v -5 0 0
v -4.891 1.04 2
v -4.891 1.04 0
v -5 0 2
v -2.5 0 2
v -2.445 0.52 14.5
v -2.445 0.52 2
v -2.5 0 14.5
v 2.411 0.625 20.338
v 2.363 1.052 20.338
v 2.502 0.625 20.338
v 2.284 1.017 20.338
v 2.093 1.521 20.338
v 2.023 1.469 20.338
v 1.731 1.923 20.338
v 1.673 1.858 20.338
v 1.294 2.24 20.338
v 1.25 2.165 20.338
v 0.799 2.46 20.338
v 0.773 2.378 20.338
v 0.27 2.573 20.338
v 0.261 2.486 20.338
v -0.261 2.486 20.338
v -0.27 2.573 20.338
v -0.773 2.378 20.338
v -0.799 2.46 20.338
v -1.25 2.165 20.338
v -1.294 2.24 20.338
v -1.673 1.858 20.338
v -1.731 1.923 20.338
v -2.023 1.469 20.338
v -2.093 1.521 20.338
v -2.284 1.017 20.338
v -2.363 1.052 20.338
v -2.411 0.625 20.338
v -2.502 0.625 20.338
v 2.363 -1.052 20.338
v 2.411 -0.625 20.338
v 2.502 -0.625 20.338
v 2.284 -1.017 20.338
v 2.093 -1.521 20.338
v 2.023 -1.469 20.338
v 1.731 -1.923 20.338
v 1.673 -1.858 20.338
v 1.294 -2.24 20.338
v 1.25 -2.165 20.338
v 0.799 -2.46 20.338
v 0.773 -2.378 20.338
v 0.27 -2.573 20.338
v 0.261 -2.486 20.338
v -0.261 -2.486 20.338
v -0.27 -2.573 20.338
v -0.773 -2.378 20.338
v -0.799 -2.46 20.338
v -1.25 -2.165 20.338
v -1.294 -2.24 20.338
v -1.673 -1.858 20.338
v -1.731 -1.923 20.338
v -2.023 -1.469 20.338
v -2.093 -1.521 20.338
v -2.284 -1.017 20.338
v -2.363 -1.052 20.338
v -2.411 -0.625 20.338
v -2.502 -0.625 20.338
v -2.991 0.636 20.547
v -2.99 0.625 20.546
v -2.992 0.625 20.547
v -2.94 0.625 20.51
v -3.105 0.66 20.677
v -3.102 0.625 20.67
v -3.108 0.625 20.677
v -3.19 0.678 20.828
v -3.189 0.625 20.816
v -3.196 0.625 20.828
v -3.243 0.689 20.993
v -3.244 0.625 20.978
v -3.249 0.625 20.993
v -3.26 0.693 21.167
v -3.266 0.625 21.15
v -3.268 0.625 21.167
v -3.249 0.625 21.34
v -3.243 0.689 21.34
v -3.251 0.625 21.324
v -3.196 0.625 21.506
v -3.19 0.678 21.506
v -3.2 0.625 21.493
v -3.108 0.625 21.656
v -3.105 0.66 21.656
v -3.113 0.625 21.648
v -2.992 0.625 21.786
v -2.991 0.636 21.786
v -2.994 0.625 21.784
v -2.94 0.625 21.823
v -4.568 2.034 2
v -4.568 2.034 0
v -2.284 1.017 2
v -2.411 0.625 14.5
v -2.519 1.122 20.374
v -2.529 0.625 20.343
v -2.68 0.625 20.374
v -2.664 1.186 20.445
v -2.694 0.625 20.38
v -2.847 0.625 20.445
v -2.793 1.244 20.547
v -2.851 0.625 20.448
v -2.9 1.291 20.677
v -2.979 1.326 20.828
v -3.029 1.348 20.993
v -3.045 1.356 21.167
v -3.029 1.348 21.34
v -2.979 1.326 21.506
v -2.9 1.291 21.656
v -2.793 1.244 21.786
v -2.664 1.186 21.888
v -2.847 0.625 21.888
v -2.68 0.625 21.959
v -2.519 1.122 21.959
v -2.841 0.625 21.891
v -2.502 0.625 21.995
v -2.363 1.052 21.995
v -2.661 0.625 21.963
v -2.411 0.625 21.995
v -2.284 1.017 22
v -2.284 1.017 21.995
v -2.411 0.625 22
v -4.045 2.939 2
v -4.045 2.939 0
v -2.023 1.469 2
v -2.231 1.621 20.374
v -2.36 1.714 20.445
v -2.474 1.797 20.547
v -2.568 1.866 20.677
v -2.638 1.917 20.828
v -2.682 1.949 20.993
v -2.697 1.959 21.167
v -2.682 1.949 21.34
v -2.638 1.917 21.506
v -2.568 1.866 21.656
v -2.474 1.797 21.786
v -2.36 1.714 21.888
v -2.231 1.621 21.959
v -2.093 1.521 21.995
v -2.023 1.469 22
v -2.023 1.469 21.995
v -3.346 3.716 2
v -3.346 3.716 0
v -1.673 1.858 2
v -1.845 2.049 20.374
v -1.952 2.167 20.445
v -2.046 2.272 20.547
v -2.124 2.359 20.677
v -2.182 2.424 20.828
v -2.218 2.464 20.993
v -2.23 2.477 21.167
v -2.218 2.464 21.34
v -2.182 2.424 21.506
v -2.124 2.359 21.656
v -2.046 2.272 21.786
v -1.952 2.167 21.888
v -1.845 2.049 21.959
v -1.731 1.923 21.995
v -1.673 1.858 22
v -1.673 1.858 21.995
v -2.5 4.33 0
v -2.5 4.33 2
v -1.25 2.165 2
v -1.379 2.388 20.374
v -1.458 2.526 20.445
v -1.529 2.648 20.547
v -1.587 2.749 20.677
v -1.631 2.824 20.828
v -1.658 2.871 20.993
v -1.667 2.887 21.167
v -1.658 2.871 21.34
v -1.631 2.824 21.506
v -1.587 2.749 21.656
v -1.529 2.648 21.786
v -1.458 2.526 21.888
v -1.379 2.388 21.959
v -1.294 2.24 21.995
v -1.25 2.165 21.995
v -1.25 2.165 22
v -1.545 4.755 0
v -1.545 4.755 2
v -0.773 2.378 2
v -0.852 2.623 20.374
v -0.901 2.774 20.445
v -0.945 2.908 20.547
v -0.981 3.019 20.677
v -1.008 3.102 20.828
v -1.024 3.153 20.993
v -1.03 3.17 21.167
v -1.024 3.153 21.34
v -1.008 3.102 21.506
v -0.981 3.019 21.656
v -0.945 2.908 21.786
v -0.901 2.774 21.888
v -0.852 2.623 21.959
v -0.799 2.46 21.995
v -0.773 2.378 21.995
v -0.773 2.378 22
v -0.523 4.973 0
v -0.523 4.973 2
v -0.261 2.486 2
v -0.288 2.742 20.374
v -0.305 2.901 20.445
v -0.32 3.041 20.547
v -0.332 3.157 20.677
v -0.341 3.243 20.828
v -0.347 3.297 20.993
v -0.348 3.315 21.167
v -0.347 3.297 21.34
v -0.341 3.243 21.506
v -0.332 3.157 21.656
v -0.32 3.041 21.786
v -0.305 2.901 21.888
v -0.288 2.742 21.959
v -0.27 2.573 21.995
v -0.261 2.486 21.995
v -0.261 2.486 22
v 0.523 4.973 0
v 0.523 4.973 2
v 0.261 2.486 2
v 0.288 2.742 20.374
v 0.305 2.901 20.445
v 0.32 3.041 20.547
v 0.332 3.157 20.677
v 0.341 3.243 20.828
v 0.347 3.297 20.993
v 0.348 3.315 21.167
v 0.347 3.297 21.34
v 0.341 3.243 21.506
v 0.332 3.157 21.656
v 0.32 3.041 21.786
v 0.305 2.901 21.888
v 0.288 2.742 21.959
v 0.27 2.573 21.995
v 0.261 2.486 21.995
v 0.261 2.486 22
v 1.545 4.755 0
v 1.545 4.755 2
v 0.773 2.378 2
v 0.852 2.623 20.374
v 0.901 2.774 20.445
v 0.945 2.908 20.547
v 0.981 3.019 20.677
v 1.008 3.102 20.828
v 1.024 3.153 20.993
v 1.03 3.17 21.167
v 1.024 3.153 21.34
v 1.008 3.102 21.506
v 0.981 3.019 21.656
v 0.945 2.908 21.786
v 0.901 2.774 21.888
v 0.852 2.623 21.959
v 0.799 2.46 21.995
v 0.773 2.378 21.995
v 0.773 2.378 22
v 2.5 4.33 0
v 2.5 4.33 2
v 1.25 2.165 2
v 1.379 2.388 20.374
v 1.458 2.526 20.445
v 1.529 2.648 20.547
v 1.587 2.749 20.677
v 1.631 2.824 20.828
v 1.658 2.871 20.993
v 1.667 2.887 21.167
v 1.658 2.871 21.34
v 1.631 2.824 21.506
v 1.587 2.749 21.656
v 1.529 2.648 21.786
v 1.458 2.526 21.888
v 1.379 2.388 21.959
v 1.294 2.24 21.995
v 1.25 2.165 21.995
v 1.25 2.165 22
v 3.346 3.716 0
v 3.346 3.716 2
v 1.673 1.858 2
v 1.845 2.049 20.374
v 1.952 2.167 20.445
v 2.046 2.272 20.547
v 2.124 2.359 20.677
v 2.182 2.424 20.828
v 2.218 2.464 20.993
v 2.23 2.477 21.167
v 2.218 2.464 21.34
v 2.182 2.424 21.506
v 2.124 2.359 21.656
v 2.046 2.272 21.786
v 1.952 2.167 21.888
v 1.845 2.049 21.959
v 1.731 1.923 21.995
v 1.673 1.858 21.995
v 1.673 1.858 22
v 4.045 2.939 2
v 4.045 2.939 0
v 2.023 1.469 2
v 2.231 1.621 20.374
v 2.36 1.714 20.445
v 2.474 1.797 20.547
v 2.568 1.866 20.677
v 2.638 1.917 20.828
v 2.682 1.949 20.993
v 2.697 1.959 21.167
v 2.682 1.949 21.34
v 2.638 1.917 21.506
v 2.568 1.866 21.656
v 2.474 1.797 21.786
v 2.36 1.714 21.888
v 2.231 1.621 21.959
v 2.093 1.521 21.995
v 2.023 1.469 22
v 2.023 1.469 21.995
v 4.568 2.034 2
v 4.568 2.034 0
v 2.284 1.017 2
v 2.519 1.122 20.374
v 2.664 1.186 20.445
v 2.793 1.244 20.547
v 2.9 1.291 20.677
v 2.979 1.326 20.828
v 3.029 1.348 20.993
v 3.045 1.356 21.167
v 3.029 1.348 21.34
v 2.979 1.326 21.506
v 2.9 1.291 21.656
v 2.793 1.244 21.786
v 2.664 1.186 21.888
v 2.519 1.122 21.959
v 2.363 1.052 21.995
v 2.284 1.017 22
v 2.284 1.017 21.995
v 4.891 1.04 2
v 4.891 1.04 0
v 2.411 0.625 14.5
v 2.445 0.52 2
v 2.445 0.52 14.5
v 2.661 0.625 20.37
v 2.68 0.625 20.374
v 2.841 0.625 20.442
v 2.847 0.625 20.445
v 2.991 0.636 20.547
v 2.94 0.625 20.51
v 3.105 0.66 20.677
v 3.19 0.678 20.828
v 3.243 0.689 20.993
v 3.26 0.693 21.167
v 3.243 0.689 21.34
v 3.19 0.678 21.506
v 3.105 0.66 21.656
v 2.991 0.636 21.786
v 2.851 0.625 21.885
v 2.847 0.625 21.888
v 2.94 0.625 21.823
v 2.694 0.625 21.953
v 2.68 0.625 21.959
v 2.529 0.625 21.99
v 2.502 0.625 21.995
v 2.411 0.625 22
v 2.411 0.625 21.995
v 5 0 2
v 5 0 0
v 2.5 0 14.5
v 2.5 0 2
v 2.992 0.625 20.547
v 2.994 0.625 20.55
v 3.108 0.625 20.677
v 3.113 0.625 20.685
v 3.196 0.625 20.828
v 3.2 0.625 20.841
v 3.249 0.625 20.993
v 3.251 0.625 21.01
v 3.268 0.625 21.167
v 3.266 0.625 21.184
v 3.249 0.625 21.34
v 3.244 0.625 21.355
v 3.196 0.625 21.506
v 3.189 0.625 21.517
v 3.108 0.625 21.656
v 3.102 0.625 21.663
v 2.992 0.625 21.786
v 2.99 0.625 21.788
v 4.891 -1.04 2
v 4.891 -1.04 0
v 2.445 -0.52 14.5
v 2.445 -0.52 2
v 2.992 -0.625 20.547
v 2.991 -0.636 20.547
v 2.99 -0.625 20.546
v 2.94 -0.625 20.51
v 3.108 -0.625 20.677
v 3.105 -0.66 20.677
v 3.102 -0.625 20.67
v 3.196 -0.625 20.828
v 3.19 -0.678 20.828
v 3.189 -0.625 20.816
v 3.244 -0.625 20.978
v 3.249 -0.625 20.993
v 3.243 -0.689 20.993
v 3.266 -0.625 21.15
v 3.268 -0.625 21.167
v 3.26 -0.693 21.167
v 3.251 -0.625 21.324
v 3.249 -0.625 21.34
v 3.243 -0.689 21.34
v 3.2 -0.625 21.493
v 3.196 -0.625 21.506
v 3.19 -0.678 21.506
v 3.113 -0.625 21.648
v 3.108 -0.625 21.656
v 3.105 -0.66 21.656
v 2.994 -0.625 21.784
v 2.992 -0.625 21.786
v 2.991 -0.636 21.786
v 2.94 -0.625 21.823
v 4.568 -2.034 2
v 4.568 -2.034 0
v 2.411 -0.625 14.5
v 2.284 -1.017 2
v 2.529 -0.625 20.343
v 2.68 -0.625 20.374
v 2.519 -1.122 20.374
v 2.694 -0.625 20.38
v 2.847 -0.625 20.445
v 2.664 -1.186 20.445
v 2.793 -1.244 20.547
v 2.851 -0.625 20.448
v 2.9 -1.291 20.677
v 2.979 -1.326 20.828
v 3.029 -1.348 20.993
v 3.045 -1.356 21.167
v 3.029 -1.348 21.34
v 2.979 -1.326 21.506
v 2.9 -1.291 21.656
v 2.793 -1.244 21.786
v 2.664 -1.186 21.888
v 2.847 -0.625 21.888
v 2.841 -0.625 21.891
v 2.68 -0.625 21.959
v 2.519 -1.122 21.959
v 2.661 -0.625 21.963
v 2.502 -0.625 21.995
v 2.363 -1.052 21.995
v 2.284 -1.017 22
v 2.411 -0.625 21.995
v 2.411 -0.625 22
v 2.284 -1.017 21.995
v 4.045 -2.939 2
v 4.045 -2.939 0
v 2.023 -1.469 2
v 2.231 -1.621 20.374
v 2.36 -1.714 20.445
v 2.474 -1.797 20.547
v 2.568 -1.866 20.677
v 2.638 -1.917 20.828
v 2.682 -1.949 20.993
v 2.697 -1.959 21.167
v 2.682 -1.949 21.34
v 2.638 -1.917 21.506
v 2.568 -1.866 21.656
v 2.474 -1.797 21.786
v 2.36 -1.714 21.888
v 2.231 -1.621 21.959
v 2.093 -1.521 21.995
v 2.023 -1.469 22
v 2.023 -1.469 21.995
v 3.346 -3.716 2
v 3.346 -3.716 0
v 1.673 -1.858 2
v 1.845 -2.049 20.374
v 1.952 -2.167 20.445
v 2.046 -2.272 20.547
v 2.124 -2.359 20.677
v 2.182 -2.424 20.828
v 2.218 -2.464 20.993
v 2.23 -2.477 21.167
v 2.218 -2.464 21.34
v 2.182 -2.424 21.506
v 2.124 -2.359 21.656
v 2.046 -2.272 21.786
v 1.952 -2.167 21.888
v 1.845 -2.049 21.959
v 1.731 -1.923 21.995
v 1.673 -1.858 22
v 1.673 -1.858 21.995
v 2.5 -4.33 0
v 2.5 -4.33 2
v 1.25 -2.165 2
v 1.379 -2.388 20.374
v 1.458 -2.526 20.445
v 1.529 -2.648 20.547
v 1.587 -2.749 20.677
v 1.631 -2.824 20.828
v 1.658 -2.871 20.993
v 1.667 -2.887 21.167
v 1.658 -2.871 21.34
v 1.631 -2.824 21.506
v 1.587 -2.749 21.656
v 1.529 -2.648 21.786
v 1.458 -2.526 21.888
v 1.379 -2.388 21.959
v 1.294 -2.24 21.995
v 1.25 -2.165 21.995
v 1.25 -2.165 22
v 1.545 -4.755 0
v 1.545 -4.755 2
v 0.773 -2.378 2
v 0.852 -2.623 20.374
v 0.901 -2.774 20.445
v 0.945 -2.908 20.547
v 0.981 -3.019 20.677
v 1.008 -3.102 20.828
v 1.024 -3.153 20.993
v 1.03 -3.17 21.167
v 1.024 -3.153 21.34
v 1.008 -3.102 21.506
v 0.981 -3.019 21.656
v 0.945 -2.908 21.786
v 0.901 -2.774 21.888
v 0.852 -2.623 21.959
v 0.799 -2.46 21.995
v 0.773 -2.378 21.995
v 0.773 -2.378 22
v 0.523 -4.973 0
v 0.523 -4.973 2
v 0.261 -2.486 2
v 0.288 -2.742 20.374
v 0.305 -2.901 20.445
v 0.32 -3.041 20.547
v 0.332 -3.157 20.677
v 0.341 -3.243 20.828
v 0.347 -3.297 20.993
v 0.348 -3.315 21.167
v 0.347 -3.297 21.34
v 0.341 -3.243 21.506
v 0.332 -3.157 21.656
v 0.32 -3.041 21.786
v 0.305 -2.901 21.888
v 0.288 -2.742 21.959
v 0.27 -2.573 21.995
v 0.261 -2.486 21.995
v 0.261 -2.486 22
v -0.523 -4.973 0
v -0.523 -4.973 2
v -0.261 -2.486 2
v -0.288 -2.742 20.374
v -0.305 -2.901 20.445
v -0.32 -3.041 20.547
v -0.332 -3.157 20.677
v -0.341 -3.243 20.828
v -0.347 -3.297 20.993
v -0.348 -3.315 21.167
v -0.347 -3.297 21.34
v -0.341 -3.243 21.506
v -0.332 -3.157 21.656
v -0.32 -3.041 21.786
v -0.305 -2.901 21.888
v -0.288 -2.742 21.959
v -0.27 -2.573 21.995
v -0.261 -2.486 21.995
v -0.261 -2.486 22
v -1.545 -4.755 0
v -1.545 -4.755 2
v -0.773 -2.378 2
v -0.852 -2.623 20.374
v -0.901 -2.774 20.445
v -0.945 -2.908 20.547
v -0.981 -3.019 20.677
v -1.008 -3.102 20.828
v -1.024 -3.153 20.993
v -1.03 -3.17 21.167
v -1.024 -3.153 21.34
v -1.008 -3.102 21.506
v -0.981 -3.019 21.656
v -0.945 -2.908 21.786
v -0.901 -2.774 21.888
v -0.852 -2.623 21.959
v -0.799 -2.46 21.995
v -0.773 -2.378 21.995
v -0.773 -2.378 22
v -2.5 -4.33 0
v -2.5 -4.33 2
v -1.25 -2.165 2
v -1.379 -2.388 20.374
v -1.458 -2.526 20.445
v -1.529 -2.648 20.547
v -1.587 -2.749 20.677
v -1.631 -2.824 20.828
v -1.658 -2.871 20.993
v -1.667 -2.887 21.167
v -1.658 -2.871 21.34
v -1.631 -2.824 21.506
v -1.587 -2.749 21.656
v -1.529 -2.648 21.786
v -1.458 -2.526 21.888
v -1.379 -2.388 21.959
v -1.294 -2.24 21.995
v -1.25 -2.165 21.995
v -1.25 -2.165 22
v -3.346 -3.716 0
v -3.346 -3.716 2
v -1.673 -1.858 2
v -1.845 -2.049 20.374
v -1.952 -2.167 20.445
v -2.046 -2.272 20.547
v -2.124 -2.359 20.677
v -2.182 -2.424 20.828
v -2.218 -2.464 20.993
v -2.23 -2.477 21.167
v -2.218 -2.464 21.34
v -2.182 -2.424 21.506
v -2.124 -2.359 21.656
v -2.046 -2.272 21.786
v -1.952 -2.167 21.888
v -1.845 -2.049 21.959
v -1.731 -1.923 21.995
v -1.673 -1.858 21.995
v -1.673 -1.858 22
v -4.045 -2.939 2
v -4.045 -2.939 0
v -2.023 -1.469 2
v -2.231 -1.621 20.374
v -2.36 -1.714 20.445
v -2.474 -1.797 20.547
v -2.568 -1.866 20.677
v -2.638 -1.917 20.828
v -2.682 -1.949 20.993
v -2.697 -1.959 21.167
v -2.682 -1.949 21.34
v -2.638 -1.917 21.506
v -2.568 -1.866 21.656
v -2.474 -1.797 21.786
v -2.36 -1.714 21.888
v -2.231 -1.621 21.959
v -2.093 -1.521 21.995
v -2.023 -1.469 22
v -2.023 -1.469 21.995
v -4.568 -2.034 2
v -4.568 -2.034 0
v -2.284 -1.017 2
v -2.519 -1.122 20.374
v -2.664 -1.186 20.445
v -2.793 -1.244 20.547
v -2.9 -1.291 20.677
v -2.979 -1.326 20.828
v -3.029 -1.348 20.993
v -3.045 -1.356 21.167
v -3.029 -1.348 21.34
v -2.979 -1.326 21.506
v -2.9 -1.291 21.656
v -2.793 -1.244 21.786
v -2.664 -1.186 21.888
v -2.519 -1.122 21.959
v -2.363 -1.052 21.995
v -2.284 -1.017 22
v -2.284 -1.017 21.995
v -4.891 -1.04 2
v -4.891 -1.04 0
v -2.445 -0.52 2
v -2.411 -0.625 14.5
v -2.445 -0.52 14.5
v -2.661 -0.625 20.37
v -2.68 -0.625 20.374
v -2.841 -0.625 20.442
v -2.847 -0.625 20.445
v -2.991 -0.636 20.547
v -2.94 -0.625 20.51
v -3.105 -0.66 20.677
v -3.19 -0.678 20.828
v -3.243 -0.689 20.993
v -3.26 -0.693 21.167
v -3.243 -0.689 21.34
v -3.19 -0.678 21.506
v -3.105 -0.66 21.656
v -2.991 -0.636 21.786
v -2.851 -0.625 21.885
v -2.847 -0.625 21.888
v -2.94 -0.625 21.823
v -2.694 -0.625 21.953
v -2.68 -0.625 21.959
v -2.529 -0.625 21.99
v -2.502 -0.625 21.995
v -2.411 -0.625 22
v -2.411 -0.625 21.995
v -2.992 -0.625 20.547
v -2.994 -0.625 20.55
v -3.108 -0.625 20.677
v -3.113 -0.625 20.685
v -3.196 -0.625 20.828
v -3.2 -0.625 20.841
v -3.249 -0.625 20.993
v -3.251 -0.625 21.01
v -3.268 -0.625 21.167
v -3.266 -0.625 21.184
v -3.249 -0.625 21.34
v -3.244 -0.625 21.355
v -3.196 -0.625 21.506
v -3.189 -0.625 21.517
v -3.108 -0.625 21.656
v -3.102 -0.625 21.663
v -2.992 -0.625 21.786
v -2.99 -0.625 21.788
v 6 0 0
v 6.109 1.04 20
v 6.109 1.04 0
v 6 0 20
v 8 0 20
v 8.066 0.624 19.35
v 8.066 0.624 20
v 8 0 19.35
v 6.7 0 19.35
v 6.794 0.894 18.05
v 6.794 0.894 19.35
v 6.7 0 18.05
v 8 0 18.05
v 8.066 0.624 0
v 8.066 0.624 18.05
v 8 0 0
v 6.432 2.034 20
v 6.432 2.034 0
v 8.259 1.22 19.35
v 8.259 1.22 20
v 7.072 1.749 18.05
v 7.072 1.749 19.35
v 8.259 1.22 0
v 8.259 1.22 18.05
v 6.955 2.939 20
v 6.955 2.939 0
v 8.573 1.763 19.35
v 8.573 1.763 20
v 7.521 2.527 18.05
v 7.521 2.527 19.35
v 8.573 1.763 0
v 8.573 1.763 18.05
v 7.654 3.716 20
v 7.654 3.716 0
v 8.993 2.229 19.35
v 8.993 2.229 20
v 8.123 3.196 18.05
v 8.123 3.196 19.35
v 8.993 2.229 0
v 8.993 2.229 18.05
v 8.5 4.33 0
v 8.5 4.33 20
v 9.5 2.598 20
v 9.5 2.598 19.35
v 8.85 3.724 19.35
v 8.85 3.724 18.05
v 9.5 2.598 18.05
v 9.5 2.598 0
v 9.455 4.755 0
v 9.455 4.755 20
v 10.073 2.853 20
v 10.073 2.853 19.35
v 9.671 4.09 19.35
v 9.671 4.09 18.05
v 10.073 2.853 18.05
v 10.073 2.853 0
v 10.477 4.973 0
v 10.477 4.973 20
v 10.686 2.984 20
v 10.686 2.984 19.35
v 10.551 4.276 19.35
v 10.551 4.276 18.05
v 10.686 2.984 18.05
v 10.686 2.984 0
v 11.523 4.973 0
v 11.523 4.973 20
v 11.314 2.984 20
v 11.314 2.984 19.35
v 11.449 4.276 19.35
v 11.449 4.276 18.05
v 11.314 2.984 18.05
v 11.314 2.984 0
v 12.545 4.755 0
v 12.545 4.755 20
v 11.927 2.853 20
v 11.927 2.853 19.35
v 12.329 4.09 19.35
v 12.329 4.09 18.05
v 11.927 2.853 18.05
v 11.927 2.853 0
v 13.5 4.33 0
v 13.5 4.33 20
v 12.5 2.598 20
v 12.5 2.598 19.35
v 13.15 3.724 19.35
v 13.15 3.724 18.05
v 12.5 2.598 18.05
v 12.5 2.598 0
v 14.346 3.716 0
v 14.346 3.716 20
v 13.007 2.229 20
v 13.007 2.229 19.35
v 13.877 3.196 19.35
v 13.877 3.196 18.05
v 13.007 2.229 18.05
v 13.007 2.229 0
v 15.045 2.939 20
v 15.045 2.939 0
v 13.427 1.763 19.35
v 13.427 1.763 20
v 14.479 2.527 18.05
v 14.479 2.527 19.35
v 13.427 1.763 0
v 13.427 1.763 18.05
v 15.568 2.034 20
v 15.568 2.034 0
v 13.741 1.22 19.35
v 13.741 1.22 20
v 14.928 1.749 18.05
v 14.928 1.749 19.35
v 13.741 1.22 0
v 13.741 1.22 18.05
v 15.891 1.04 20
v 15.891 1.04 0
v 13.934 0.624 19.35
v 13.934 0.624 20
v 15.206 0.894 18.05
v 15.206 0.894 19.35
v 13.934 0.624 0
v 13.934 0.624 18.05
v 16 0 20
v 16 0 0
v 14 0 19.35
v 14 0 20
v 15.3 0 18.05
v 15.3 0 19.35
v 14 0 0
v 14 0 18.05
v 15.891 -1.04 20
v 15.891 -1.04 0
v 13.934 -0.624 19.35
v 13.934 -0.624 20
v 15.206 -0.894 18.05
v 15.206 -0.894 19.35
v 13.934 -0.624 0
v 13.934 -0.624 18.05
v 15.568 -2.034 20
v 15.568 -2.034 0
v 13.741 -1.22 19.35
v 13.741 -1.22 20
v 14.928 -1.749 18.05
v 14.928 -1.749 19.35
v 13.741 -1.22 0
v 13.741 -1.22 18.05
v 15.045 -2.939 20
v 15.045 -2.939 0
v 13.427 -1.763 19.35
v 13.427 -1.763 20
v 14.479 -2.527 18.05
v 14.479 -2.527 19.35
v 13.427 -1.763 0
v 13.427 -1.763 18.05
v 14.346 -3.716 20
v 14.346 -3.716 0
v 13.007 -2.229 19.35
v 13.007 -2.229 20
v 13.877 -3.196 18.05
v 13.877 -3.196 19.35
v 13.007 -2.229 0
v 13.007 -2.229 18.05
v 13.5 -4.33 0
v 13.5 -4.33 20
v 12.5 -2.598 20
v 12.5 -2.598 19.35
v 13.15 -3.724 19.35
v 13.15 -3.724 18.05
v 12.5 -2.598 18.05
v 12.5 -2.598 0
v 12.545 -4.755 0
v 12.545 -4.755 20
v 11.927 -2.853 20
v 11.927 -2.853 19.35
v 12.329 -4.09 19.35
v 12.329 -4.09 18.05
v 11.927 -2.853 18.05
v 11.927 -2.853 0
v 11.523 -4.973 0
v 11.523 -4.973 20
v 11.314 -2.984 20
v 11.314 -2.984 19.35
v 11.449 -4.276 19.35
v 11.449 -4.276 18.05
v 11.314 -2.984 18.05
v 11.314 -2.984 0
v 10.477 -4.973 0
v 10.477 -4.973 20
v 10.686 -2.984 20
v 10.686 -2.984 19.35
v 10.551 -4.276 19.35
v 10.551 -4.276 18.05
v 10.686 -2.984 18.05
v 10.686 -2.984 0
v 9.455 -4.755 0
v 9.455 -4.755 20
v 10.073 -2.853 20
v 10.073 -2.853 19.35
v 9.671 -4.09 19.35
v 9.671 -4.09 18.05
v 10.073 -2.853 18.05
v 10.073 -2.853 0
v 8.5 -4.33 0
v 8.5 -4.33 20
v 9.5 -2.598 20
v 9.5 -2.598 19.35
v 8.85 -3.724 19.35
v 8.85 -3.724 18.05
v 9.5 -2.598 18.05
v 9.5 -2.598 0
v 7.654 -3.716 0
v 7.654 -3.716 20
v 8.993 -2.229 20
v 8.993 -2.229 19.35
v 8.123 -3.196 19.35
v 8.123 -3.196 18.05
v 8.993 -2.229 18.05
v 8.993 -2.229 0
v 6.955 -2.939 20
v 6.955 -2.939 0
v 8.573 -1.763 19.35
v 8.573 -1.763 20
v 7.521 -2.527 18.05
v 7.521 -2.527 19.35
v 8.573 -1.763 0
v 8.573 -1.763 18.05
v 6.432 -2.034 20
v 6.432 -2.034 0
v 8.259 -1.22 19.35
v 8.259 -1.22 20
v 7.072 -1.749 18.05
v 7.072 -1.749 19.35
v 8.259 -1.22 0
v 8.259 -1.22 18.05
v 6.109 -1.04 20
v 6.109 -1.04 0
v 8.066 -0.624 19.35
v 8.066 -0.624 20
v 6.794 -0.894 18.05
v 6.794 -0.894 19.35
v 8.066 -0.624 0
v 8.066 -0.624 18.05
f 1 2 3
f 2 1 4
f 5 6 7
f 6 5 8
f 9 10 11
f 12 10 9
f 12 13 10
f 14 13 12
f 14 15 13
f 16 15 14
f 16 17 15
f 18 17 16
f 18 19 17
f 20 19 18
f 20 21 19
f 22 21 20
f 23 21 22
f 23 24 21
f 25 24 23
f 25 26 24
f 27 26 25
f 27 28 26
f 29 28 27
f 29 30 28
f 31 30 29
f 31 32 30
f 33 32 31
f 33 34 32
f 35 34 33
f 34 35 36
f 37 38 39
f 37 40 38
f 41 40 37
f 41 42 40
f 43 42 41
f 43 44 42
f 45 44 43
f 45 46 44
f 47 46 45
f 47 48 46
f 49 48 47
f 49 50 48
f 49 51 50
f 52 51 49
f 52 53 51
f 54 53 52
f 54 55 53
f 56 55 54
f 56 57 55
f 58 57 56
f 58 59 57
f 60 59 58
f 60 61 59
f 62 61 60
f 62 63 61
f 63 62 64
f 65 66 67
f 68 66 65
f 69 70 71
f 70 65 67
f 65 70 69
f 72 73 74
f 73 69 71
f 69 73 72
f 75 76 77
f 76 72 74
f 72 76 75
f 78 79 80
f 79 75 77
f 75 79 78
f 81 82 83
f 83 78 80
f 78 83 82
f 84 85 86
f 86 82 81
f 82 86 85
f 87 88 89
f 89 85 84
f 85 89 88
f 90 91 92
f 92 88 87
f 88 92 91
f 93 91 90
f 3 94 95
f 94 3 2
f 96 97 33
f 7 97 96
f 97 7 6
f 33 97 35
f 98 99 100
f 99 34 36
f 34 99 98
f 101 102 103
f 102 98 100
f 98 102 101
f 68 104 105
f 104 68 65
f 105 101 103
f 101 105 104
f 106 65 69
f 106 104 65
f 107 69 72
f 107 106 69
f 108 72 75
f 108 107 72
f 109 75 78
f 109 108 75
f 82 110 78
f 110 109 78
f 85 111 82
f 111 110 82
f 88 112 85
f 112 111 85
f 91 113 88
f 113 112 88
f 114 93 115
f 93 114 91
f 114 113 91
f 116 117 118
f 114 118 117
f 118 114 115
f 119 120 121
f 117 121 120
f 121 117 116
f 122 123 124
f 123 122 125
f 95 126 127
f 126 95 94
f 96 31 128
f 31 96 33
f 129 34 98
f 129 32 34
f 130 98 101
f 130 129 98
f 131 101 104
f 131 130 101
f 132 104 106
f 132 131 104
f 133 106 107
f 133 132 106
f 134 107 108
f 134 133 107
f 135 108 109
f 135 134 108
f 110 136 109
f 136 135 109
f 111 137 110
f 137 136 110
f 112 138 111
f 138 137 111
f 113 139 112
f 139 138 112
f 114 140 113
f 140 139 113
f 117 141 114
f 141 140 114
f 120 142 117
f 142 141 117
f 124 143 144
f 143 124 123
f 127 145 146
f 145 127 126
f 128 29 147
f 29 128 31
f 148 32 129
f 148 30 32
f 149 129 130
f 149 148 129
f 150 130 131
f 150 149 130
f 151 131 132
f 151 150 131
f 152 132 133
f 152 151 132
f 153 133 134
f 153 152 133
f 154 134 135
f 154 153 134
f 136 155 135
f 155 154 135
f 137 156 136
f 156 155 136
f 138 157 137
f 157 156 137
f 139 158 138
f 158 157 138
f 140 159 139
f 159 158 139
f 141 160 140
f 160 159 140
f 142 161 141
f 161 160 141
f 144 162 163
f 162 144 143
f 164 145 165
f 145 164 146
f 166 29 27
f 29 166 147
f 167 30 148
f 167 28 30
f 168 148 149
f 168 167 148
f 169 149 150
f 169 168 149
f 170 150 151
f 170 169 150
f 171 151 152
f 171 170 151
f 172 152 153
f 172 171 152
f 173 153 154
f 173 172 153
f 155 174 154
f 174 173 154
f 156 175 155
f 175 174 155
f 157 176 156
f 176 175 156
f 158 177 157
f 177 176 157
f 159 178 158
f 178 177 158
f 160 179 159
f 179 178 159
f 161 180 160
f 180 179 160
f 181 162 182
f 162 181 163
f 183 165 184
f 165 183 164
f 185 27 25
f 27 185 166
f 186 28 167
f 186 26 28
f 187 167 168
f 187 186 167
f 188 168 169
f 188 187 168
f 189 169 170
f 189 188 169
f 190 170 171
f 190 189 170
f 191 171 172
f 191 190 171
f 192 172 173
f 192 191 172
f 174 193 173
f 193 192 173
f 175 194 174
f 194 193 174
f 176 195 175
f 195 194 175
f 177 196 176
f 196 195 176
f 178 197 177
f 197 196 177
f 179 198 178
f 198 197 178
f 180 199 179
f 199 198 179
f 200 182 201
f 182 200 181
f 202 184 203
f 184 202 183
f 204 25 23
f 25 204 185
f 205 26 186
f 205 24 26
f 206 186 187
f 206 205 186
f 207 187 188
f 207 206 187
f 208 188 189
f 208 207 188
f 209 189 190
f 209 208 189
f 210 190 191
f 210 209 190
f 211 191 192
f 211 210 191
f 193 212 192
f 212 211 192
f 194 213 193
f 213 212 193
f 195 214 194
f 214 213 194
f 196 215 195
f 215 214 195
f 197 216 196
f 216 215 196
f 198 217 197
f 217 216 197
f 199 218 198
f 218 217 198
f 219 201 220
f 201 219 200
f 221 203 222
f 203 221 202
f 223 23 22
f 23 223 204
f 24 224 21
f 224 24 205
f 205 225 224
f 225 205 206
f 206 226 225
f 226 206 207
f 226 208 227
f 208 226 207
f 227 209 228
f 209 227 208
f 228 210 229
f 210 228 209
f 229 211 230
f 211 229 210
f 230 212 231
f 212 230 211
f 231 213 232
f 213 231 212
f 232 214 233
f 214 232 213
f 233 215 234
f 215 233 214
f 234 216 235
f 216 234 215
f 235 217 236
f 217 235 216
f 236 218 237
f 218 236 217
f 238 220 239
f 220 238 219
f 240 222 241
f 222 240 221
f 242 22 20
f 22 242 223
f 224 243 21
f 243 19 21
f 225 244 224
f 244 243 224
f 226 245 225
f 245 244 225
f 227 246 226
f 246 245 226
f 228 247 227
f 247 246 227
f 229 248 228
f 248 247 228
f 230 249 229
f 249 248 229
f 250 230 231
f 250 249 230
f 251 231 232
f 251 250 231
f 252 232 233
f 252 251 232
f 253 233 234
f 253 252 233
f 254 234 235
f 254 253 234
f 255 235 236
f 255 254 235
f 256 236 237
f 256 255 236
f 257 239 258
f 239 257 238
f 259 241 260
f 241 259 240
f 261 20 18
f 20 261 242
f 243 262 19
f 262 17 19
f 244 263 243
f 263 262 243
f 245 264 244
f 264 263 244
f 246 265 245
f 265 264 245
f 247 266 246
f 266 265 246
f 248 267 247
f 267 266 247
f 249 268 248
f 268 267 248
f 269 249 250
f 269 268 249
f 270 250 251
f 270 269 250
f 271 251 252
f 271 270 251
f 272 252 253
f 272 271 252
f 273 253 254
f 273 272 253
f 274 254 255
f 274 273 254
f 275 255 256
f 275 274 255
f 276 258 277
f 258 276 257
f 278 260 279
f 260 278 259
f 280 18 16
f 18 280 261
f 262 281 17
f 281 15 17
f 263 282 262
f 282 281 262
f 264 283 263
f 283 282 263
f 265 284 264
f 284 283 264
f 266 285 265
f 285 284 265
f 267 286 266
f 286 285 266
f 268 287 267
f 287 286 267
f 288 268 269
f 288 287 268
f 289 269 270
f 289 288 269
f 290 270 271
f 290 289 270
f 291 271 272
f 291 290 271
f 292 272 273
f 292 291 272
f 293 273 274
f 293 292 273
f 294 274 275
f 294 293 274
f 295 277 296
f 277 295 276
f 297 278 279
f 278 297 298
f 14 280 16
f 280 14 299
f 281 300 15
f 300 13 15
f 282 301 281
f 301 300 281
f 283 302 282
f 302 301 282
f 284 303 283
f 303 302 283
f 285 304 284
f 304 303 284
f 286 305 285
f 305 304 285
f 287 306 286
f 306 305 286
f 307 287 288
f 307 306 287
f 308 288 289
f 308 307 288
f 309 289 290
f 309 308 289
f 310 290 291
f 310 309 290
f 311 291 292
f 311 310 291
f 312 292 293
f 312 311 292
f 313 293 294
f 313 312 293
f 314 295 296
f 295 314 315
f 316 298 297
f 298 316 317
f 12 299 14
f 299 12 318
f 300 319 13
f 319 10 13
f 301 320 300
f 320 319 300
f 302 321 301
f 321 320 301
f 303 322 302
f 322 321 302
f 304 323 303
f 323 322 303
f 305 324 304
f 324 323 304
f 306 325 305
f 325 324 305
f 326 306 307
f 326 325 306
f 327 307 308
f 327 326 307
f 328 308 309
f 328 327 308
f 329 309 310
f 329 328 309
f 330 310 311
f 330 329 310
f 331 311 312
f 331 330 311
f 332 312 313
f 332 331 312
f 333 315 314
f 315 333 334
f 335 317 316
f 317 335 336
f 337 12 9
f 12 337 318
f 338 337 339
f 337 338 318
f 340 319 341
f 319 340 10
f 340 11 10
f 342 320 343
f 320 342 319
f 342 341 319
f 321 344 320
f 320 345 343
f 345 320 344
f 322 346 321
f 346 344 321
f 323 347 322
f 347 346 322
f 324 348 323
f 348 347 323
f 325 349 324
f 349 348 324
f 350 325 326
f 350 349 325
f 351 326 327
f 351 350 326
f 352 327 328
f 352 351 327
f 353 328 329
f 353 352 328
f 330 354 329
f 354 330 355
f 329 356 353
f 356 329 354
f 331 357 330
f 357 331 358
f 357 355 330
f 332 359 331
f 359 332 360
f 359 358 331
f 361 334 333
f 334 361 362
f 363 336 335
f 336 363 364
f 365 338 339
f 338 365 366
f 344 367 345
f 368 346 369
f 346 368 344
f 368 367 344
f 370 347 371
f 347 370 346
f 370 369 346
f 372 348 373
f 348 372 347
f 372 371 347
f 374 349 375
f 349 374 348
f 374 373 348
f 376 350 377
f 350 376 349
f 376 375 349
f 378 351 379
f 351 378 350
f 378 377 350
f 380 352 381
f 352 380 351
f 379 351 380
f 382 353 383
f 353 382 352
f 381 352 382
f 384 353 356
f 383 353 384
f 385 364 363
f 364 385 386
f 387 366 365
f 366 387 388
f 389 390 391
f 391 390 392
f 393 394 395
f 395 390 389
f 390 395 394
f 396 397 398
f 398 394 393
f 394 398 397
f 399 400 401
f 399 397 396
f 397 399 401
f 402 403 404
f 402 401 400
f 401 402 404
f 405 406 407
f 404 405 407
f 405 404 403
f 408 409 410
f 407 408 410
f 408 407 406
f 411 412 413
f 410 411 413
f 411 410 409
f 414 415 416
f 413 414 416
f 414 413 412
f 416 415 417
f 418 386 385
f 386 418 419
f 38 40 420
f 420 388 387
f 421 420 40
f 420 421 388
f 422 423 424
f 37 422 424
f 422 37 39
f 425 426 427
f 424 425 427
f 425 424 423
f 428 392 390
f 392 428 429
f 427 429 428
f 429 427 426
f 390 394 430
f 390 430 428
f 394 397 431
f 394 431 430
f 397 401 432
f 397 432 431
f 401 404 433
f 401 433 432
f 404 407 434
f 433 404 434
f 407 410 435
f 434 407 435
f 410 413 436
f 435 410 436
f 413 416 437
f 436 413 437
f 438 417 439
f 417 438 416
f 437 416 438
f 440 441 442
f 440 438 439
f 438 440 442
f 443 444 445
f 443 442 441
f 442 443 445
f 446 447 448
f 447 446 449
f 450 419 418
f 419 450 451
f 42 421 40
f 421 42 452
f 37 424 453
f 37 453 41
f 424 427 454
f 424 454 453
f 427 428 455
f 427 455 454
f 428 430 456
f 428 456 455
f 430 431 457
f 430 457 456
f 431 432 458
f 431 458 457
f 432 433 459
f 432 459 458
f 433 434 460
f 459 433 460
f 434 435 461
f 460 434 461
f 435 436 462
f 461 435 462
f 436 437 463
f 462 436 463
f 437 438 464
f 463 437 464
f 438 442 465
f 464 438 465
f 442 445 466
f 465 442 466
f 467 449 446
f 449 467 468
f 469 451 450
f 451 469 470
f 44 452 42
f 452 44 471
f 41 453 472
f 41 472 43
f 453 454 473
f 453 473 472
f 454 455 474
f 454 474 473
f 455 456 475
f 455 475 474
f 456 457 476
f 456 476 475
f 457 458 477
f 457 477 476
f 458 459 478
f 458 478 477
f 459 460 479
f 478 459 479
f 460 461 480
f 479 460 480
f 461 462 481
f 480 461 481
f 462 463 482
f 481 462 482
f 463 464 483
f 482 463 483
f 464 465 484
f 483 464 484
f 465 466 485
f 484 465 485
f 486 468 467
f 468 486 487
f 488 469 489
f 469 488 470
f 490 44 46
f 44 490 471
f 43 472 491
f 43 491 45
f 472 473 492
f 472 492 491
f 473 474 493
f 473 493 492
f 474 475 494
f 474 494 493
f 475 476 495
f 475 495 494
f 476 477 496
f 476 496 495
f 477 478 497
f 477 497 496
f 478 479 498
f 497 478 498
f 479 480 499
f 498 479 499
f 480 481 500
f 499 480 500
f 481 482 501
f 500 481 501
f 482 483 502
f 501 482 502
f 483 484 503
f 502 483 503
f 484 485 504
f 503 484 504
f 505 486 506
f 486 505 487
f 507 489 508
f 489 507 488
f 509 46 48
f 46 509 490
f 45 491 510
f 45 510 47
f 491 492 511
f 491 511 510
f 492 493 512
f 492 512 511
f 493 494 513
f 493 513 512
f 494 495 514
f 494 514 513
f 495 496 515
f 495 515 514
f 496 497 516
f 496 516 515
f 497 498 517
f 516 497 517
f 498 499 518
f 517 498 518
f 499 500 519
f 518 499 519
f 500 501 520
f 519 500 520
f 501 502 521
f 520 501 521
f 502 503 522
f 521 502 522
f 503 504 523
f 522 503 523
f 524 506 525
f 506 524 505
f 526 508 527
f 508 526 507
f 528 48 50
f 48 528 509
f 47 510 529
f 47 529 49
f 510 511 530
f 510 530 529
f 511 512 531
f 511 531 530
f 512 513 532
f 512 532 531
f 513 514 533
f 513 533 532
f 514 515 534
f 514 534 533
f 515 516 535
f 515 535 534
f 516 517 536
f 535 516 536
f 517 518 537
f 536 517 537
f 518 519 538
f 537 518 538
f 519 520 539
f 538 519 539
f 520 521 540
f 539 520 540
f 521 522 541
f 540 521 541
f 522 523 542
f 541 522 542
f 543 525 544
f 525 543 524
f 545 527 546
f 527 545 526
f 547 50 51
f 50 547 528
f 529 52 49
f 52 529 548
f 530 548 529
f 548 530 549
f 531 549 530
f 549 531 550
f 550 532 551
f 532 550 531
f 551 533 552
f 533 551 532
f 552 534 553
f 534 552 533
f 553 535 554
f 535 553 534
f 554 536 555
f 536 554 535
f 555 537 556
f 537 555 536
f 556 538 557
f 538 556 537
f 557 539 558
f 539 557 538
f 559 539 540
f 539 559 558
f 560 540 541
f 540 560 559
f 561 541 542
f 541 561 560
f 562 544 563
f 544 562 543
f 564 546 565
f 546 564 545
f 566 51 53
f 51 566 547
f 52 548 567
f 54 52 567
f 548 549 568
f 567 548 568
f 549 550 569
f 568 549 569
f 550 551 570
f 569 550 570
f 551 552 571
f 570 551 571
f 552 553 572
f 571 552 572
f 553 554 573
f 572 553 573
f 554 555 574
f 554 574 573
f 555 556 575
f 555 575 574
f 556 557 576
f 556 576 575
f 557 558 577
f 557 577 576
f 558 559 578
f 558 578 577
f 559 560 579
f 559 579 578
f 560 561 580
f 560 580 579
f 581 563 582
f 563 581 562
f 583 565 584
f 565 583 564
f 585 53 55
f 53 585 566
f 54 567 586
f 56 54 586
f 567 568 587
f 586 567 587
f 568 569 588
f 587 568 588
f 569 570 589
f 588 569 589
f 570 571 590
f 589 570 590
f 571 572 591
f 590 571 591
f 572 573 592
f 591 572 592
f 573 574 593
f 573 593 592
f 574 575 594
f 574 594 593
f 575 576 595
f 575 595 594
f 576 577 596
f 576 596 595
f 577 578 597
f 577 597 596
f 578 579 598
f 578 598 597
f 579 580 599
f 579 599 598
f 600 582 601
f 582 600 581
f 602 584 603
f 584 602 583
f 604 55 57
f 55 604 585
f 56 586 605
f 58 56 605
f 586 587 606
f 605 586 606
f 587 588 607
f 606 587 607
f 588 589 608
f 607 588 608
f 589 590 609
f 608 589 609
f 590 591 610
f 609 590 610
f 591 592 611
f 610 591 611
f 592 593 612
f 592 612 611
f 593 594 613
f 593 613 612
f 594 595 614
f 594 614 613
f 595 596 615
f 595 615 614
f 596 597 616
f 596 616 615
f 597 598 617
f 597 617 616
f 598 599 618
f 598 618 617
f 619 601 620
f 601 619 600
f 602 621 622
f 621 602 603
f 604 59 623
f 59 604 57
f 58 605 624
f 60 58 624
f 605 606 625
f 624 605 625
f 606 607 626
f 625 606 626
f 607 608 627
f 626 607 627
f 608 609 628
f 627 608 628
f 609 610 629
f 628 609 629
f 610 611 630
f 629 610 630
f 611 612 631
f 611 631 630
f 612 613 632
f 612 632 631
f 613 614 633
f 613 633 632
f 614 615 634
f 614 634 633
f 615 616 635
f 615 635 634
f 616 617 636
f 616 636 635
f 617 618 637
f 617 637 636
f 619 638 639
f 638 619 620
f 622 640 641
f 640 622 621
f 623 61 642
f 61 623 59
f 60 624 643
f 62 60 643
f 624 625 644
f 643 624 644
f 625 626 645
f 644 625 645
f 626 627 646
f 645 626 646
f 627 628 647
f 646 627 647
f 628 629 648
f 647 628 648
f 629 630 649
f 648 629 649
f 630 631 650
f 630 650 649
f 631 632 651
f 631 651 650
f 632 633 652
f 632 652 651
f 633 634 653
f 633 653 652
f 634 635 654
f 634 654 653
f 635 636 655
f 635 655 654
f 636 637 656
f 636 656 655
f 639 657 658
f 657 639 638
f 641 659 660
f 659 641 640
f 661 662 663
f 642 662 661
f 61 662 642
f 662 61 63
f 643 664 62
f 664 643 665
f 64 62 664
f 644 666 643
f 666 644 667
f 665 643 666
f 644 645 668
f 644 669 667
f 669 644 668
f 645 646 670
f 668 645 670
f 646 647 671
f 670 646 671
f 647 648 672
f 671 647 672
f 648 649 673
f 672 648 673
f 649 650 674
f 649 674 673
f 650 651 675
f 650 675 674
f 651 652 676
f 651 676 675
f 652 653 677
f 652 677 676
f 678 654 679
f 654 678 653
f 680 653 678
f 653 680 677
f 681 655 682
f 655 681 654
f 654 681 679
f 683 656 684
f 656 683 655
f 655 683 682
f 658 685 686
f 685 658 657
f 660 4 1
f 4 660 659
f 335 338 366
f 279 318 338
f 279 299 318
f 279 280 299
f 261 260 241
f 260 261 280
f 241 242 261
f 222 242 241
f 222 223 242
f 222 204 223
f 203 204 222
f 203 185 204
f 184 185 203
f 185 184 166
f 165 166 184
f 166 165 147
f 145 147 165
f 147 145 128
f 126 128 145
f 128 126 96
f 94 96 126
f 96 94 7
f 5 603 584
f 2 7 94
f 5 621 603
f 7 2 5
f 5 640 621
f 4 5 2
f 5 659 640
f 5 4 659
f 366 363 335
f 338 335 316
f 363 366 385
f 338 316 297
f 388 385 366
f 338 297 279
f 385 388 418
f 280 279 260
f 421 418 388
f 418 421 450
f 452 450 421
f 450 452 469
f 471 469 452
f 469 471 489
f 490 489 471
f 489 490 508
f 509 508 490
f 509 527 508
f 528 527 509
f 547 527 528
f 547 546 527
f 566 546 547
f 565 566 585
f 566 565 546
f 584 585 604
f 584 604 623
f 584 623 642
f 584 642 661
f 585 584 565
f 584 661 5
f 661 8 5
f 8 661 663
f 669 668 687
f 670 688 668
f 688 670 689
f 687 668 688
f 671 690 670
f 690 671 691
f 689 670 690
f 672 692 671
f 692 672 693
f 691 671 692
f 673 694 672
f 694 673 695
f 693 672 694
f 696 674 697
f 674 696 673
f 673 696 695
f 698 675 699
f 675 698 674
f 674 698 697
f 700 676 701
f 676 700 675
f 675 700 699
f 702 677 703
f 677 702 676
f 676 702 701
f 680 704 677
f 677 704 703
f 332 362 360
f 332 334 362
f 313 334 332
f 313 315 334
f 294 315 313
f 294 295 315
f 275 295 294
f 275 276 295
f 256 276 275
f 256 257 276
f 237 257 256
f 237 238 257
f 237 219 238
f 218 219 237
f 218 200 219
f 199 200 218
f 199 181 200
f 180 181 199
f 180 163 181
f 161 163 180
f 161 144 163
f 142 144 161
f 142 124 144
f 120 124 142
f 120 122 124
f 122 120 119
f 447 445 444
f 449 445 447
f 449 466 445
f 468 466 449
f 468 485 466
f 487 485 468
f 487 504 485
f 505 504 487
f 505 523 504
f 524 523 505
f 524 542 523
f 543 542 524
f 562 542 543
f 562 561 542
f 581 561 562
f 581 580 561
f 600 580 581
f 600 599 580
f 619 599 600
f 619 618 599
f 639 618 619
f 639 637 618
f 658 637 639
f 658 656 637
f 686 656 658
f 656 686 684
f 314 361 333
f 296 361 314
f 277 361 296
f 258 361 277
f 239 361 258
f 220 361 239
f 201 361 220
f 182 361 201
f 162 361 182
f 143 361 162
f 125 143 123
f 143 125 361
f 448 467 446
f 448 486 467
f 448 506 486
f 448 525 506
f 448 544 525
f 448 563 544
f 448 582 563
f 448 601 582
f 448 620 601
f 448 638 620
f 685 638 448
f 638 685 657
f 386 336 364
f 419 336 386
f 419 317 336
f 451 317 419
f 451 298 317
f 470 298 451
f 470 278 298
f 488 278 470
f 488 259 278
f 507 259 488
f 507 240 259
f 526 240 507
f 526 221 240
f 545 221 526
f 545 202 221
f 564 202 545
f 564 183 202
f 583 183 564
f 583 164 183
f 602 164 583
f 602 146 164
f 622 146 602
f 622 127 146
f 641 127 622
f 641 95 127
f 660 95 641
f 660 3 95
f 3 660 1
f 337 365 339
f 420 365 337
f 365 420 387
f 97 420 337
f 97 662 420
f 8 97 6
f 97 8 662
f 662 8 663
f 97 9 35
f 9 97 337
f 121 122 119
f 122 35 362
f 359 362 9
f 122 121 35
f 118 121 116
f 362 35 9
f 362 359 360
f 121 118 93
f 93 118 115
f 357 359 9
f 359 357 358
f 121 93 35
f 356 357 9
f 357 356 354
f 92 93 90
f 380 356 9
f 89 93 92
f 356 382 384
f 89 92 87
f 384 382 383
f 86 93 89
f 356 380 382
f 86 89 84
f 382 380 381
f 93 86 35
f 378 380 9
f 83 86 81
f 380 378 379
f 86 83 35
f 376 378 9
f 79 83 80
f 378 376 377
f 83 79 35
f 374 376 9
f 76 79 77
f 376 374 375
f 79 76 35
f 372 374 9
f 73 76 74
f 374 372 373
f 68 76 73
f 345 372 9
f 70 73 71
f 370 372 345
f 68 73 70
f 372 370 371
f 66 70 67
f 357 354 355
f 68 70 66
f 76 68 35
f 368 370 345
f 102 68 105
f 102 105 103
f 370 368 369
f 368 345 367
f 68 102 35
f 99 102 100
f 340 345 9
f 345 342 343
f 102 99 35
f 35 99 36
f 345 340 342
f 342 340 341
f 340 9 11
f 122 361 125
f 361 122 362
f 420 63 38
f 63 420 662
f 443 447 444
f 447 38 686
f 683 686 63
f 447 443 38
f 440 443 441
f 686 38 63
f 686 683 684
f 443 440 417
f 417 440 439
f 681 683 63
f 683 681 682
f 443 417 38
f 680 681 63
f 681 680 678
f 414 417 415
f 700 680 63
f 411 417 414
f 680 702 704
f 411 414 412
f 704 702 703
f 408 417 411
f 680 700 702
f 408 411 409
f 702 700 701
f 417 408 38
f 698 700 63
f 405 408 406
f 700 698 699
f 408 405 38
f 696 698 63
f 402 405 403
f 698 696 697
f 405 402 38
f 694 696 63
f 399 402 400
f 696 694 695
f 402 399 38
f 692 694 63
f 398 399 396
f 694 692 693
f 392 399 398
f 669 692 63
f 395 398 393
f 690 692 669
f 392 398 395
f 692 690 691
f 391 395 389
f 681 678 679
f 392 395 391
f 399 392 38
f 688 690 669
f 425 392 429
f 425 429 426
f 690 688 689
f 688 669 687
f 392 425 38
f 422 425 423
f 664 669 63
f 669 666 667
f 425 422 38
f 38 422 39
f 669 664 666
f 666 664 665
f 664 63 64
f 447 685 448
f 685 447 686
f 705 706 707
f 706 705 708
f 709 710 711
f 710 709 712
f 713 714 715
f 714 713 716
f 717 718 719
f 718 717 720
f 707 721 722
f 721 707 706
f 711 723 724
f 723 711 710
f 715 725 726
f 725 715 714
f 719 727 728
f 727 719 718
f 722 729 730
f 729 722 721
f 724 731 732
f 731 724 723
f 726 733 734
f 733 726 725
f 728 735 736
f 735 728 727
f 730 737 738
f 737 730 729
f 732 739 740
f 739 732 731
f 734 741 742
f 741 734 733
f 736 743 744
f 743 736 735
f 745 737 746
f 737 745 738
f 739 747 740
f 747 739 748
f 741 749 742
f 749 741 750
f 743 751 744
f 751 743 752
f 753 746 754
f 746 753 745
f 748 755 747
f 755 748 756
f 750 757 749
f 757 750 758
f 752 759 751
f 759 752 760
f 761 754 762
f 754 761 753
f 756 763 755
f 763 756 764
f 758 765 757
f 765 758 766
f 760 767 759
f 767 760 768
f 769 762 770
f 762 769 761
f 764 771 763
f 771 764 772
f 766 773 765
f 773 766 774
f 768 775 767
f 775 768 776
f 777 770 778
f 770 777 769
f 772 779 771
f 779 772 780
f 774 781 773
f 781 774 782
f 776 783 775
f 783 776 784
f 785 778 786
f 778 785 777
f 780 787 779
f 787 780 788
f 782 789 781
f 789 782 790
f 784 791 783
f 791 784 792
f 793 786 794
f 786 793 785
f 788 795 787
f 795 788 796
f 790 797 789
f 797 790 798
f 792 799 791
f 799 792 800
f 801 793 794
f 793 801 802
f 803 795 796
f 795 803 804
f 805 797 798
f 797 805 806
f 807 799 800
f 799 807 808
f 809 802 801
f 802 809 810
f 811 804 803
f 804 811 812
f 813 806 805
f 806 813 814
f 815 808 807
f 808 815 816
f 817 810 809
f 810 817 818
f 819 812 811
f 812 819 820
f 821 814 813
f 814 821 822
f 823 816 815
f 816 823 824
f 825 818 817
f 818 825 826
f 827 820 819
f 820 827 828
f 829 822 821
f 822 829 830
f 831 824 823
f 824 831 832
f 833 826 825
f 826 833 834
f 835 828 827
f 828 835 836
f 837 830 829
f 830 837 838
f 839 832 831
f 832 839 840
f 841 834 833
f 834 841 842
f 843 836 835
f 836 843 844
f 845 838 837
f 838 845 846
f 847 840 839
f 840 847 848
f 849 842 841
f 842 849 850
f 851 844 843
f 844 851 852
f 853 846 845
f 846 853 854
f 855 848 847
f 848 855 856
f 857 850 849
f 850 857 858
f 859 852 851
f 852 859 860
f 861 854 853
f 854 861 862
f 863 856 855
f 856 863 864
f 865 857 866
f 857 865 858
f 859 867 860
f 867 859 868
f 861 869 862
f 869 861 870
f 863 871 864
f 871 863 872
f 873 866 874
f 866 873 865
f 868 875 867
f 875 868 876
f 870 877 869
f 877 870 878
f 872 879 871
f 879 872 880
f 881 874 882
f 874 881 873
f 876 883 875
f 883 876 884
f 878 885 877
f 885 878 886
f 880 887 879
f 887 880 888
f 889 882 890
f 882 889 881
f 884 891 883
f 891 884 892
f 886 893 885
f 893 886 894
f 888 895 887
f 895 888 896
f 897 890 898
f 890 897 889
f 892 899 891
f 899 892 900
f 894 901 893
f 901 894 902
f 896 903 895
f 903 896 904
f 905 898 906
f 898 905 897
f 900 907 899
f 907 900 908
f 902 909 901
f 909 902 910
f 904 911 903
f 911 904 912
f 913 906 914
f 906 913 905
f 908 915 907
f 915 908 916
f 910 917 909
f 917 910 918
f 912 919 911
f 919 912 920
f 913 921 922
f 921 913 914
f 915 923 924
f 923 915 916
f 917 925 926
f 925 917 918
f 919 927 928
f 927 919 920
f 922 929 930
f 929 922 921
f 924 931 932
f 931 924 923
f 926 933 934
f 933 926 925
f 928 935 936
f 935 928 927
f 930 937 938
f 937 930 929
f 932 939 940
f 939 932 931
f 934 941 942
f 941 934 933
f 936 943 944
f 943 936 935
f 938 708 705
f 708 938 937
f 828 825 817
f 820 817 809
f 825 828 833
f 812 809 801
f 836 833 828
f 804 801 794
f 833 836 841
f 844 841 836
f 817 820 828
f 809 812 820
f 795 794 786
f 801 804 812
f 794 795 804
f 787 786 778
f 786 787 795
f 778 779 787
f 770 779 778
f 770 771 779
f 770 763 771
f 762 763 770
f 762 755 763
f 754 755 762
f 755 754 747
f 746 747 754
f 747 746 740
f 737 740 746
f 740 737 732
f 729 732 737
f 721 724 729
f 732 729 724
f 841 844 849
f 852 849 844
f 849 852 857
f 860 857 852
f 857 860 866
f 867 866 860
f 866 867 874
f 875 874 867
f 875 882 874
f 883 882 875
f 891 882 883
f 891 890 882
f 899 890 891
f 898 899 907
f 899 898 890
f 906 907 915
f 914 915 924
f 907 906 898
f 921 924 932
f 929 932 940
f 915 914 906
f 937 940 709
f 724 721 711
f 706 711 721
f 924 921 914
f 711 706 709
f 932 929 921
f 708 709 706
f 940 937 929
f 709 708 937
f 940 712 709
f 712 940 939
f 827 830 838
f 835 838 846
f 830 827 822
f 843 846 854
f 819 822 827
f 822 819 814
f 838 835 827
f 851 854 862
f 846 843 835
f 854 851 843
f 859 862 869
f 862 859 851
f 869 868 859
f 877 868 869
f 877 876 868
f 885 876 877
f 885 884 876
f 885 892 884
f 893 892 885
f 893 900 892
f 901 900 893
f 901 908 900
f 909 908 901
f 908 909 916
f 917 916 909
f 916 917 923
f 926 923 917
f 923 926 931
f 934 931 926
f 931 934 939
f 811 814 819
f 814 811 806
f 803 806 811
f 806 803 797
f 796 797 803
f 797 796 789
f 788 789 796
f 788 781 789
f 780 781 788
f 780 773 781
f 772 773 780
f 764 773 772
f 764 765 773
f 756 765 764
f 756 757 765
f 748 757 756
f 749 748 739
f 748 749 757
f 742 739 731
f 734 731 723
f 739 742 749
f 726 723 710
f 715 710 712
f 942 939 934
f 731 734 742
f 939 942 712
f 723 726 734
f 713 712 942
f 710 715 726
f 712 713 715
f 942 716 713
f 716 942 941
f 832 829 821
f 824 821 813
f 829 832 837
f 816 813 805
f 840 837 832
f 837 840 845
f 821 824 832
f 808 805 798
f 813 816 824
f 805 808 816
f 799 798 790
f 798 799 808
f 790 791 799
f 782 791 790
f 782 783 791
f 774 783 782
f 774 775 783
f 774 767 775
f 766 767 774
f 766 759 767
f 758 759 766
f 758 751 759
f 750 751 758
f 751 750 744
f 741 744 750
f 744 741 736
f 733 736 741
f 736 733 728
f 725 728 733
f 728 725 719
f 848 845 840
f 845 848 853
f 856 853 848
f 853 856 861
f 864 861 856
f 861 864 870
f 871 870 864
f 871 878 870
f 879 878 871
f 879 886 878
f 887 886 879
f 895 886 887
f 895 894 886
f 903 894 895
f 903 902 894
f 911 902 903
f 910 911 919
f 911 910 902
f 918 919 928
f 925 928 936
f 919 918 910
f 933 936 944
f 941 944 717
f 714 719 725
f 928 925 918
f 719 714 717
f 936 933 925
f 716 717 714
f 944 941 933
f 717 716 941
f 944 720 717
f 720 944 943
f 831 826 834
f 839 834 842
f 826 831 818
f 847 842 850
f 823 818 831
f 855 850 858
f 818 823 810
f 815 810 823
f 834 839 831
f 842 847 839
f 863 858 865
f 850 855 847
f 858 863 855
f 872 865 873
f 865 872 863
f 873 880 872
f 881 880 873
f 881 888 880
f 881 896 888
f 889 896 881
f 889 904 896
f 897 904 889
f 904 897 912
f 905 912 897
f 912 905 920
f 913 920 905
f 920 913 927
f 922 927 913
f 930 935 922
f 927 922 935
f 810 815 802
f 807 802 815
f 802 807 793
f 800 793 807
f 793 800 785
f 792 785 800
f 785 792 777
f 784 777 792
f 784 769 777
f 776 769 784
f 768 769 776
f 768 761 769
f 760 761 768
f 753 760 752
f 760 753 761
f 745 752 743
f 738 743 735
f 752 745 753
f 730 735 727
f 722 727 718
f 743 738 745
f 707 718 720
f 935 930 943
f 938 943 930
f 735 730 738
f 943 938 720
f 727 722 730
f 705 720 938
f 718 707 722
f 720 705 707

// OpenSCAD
pin_length = 20;
outer_radius = 5;

unit = pin_length / 50;
pin_radius = outer_radius / 2;
nub_radius = pin_radius / 3;

$fs = outer_radius / 75;

male();
translate([outer_radius * 2.2, 0, 0]) female();
//female();

module male() {
    base = unit * 5;
    union() difference() {
    rotate_extrude() {
            square([outer_radius, base]); // base
            echo("####>pin diameter: ", pin_radius * 2);
            echo("####>nub diameter: ", nub_radius * 2 + pin_radius * 2);
            translate([0, base, 0])
                square([pin_radius, pin_length]); // pin
            translate([pin_radius, base + pin_length - nub_radius])
                circle(nub_radius, $fs=nub_radius * 0.06); // nub
        }
        slice_length = (pin_radius + nub_radius) * 2; // clean through
        slice_thickness = pin_radius / 2;
        slice_depth = pin_radius * 3;
        slice_translation = base + pin_length - slice_depth / 2;
        translate([0,0, slice_translation])
            cube([slice_length, slice_thickness, slice_depth], center=true);
    }
}

module female() {
    receiver_radius = pin_radius * 1.2;
    receiver_wall_thickness = outer_radius - receiver_radius;
    keyway_size = nub_radius * 1.2 * 1.3;
    keyway_backoff = keyway_size / 2;
    echo("####>receiver diameter: ", receiver_radius * 2);
    echo("####>receiver wall: ", receiver_radius * 2);
    echo("####>receiver outer diameter: ", receiver_radius * 2 + receiver_wall_thickness * 2);
    echo("####>keyway diameter: ", receiver_radius * 2 + keyway_size * 2);
    rotate_extrude() difference() {
        translate([receiver_radius, 0, 0])
            square([receiver_wall_thickness, pin_length]);
       translate([receiver_radius, pin_length - keyway_size - keyway_backoff])
            square([keyway_size, keyway_size]);
    }
}
